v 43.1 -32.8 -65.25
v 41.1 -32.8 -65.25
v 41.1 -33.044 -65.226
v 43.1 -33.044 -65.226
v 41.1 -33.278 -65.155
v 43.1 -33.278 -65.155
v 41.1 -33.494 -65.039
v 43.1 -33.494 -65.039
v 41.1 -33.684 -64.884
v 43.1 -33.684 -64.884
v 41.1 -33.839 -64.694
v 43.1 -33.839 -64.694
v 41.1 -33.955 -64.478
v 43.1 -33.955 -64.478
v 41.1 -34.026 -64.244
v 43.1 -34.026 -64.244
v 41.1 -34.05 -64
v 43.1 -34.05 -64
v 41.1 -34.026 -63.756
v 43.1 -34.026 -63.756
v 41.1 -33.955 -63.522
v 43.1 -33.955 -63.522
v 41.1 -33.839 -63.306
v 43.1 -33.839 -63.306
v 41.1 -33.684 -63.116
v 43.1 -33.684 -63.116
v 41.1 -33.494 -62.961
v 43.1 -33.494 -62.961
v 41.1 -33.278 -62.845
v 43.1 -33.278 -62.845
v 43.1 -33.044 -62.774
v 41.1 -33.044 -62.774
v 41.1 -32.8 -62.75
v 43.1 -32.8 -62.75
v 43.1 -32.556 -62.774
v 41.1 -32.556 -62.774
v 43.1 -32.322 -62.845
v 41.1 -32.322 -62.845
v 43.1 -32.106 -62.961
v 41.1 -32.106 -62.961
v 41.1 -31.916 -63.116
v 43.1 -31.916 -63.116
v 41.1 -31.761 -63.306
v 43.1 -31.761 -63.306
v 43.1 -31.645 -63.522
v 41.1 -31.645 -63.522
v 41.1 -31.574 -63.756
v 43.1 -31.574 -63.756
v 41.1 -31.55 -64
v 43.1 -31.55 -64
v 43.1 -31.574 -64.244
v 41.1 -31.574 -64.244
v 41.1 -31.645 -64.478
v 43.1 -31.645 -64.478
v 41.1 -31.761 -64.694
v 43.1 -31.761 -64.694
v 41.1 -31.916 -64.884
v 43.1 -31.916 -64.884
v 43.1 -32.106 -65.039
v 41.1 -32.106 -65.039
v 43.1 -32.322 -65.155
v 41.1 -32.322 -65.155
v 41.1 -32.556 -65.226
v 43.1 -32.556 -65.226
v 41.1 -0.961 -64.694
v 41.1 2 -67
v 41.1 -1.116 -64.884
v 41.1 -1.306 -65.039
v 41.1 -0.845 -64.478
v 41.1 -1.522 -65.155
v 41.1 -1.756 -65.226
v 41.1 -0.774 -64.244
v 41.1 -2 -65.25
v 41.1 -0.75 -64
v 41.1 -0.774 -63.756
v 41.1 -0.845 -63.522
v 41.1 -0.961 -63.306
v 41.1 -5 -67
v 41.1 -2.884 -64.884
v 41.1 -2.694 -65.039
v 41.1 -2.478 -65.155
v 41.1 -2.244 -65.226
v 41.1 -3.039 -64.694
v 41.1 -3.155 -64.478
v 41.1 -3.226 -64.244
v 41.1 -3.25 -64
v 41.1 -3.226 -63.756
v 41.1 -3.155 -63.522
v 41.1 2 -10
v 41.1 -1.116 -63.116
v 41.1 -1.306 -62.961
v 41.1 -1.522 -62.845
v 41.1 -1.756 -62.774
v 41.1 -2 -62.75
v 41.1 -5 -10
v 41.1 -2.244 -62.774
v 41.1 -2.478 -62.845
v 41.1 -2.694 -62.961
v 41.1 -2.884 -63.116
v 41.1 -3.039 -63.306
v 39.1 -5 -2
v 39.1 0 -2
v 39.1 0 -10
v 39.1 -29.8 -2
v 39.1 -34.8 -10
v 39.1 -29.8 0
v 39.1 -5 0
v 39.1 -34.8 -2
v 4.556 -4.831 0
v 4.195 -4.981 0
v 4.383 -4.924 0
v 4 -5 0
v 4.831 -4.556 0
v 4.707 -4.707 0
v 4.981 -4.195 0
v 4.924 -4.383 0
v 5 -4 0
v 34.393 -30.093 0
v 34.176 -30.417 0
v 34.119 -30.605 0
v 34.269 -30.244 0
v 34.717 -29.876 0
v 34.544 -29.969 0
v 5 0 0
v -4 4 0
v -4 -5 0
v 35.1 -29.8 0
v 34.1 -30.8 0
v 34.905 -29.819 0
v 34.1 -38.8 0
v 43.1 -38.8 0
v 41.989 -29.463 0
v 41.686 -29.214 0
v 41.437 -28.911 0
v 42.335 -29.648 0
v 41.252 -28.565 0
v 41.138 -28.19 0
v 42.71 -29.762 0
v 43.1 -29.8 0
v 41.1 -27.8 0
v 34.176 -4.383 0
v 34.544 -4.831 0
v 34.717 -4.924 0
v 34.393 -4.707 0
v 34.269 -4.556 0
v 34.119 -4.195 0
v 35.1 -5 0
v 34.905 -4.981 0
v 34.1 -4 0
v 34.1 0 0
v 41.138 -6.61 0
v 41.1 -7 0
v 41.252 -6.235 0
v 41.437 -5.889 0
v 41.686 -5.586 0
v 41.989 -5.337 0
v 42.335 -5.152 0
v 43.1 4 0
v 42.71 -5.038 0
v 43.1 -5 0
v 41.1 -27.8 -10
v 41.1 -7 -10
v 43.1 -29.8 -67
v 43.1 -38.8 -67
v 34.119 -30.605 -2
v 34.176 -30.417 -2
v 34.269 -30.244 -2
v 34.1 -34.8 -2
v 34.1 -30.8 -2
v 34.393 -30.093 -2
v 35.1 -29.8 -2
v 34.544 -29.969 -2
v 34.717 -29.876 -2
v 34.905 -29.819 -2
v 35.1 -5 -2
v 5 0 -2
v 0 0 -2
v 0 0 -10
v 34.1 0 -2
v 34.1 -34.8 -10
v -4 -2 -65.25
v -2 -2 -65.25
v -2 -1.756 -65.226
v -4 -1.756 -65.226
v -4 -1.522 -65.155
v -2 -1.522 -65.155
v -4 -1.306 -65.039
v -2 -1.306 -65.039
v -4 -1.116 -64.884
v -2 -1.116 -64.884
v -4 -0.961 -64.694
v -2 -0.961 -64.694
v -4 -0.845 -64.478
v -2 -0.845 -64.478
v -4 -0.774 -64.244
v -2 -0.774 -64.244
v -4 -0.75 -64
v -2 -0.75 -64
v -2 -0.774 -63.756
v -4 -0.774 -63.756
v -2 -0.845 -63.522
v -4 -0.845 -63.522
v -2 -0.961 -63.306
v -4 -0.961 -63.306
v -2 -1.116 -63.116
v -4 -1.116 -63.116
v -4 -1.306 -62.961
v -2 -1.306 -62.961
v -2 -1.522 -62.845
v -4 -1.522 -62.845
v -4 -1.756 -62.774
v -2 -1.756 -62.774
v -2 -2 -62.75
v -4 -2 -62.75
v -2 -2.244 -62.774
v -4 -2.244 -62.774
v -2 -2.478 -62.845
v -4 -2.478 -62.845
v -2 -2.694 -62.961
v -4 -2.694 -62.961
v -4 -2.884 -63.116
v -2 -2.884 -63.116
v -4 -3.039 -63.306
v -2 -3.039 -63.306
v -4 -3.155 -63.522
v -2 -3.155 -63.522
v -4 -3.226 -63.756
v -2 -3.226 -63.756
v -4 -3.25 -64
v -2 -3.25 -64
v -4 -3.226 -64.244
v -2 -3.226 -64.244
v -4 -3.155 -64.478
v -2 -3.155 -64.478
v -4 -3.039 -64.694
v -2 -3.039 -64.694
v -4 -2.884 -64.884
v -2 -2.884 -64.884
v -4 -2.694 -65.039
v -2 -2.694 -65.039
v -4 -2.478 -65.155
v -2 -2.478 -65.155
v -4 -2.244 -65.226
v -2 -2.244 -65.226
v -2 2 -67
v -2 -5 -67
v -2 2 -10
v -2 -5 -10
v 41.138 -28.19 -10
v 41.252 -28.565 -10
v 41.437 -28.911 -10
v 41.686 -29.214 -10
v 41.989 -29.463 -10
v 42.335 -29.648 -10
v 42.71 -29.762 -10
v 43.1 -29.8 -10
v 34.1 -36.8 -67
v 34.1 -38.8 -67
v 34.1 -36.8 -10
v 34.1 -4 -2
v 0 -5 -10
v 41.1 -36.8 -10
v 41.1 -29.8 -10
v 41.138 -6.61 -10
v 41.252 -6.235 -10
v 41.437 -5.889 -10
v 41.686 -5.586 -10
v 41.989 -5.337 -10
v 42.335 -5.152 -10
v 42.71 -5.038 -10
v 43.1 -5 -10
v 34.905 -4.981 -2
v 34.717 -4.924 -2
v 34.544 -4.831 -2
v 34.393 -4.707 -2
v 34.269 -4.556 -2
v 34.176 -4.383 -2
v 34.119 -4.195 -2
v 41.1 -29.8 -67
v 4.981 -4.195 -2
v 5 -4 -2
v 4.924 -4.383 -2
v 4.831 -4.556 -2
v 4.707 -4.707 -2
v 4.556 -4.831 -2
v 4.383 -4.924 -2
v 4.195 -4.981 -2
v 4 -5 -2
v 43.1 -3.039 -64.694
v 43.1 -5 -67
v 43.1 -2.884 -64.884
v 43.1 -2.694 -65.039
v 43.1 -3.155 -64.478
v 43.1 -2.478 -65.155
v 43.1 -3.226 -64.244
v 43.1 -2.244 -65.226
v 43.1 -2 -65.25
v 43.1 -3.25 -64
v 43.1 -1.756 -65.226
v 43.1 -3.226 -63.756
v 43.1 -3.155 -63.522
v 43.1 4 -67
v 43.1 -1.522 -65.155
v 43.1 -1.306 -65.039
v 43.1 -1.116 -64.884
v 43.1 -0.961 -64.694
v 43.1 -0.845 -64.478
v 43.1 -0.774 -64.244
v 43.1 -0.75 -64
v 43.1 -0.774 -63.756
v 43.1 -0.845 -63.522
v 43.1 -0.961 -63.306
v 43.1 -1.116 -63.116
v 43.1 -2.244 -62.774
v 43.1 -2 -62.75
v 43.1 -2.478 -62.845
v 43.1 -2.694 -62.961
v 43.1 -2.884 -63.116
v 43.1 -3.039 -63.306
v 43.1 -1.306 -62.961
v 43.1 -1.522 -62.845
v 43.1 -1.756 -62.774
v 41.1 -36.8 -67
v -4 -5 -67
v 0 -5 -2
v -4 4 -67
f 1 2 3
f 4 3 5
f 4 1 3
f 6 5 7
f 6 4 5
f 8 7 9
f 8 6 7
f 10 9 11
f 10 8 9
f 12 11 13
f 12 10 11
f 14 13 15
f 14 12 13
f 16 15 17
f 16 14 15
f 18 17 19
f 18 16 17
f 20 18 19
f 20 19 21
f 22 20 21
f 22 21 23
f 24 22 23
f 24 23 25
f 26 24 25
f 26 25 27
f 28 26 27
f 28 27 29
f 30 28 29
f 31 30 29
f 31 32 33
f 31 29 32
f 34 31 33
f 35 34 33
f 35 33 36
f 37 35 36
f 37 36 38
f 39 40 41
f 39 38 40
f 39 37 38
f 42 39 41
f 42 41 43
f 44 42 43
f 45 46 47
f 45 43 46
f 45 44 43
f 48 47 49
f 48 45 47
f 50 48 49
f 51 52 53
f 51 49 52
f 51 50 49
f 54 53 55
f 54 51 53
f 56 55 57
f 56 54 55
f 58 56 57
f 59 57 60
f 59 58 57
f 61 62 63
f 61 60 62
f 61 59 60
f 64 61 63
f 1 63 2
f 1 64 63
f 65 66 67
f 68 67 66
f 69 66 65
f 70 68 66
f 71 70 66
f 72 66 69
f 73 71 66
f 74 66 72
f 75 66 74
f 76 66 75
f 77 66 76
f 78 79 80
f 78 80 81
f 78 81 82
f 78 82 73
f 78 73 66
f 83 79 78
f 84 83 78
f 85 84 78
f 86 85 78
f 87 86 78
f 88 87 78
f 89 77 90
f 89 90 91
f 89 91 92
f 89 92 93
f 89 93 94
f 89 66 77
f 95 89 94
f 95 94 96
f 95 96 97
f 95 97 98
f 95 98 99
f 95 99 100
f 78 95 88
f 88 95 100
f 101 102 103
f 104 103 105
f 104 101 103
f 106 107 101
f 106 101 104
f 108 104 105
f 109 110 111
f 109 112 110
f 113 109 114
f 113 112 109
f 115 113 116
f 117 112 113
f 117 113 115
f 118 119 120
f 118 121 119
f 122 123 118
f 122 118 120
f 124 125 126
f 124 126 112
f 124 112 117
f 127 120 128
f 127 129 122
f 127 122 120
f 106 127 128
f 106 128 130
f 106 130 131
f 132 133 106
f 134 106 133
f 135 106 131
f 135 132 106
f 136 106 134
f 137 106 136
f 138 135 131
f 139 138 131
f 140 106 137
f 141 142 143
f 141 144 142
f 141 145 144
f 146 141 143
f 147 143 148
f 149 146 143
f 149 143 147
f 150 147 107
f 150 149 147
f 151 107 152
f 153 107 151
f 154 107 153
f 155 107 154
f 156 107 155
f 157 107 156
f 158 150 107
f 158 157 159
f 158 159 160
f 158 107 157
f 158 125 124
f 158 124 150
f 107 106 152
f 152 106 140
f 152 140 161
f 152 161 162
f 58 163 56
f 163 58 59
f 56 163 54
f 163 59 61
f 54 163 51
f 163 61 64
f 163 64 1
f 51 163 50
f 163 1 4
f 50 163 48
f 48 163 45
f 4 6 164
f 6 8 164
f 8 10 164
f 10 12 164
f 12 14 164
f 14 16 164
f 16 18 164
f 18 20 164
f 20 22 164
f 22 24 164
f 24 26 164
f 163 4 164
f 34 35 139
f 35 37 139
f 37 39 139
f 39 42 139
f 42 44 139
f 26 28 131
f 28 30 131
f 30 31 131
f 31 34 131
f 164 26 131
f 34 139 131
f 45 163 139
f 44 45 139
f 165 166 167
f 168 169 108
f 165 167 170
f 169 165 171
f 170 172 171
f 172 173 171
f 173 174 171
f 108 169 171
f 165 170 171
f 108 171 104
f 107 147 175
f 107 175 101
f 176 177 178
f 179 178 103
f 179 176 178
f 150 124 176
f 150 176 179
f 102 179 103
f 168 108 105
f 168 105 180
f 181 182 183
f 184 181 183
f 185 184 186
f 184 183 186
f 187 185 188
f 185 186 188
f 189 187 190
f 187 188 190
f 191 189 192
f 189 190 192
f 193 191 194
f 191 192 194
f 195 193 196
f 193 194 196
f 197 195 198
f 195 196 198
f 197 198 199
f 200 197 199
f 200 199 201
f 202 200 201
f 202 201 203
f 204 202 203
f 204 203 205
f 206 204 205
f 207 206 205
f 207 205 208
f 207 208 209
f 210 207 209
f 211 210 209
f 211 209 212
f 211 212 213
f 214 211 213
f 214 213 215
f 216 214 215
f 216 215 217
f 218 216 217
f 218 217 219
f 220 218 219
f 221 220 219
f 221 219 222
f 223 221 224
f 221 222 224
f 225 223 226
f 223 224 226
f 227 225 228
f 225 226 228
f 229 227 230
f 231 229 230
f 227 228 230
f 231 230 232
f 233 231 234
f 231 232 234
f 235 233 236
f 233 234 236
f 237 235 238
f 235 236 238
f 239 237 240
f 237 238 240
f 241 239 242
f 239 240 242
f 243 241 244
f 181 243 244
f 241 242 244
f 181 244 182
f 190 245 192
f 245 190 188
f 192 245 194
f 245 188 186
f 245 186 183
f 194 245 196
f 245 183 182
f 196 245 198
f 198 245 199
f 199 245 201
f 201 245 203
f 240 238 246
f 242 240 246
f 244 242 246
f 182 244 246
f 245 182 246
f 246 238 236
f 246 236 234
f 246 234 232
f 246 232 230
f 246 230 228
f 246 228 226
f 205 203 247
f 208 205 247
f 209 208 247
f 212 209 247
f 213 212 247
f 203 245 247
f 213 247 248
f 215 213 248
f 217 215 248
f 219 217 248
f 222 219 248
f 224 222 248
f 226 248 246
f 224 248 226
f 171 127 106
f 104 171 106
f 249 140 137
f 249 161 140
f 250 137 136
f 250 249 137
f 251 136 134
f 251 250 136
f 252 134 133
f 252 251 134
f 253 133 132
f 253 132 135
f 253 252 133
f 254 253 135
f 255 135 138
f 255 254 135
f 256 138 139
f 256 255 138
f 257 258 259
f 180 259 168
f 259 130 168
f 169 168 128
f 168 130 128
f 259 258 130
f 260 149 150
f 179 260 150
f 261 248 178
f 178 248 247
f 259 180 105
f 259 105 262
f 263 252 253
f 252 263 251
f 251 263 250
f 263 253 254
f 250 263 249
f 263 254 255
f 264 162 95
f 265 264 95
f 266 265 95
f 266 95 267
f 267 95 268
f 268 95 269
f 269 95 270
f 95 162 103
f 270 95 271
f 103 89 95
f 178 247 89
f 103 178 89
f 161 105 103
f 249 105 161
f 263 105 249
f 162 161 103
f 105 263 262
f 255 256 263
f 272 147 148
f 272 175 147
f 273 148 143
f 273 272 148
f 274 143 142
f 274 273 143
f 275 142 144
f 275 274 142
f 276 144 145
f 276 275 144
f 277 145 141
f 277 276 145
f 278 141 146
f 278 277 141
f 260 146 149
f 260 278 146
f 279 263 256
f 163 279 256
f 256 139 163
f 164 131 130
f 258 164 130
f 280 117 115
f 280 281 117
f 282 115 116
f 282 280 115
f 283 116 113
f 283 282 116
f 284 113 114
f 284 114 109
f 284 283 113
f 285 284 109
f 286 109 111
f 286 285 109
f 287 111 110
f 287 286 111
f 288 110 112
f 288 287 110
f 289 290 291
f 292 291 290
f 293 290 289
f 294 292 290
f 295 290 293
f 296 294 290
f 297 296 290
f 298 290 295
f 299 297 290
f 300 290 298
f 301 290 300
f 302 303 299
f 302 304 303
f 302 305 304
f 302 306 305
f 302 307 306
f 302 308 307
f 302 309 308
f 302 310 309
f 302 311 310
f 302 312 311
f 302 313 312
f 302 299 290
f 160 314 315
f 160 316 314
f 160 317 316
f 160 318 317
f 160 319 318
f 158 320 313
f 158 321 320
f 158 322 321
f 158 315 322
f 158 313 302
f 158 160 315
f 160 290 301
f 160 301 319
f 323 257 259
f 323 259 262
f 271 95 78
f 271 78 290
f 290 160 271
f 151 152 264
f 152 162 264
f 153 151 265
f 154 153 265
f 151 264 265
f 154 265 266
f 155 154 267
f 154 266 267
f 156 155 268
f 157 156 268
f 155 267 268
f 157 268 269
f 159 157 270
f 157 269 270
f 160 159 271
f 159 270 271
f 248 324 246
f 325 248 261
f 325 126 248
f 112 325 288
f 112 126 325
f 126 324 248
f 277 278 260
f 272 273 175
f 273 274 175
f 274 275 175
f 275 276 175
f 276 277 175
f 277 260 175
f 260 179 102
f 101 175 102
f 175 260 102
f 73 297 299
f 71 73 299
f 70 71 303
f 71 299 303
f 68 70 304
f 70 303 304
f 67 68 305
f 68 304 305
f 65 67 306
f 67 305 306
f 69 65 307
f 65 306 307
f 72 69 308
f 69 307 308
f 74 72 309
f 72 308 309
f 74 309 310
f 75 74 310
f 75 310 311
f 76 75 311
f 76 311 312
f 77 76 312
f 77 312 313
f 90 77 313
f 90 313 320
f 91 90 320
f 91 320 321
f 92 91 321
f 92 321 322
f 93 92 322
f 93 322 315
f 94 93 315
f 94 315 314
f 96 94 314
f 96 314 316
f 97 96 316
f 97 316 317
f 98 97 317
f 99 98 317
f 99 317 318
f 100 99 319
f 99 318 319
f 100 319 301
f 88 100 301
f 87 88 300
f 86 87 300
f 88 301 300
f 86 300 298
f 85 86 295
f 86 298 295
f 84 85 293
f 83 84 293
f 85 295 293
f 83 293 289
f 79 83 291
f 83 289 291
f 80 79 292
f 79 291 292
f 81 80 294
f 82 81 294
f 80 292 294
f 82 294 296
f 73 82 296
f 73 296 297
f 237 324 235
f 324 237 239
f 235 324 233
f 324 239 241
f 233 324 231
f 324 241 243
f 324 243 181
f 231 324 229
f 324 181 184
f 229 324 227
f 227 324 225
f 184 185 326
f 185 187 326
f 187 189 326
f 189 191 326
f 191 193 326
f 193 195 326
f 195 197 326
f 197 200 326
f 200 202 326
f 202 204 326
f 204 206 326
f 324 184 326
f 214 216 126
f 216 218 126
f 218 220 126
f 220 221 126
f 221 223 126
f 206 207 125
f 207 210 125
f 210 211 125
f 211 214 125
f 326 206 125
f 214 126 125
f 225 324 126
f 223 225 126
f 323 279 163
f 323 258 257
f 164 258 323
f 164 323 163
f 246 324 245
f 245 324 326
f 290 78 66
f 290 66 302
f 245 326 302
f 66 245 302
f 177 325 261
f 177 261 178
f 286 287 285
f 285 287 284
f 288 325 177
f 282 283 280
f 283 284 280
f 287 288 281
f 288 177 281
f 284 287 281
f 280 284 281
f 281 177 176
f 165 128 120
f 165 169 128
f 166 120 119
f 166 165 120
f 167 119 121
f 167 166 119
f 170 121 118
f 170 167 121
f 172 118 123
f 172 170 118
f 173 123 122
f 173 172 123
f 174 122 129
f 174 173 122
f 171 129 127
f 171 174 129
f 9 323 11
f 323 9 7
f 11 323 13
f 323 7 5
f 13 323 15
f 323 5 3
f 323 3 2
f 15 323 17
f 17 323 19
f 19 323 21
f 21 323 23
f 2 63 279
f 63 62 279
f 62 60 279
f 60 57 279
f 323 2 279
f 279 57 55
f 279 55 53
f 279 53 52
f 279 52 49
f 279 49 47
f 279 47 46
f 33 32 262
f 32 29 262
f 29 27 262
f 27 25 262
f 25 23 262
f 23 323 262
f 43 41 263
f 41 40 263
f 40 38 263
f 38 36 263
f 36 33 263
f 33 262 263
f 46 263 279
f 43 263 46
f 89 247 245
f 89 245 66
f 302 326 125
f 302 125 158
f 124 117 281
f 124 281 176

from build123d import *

# Parameters (mm, degrees)
EXTRUDE_THIN1_DEPTH  = 10
SKETCH2_W            = 7
SKETCH2_H            = 7
BOSS_EXTRUDE1_DEPTH  = 2
FILLET1_R            = 1
BOSS_EXTRUDE2_DEPTH  = 67
SKETCH4_R            = 1.25
CUT_EXTRUDE1_DEPTH   = 91.624775862
FILLET2_R            = 2
MOVE_START           = -67
MOVE_FACE1_OUTLINE_W = 29.1
MOVE_FACE1_OUTLINE_H = 2
MOVE_FACE1_DEPTH     = 67


# Read off the part's stored shape, not the designer's step: Move Face1
with BuildPart() as part:
    # Sketch1 → Extrude-Thin1 (new body)
    with BuildSketch(Plane.XY):
        Polygon((0, -5), (0, 0), (39.1, 0), (39.1, -34.8), (34.1, -34.8), (34.1, -36.8), (41.1, -36.8), (41.1, 2), (-2, 2), (-2, -5), align=None)
    extrude(amount=-EXTRUDE_THIN1_DEPTH)

    # Sketch2 → Boss-Extrude1 (add)
    with BuildSketch(Plane.XY):
        with Locations((1.5, -1.5)):
            Rectangle(SKETCH2_W, SKETCH2_H)
        with Locations((37.6, -1.5)):
            Rectangle(SKETCH2_W, SKETCH2_H)
        with Locations((37.6, -33.3)):
            Rectangle(SKETCH2_W, SKETCH2_H)
    extrude(amount=-BOSS_EXTRUDE1_DEPTH)

    # Fillet1
    fillet1_edges = [part.edges().sort_by_distance(p)[0] for p in [
        (5, -5, -1),
        (34.1, -5, -1),
        (34.1, -29.8, -1),
    ]]
    fillet(fillet1_edges, radius=FILLET1_R)

    # Sketch3 → Boss-Extrude2 (add)
    with BuildSketch(Plane.XY):
        Polygon((34.1, 2), (41.1, 2), (41.1, -5), (43.1, -5), (43.1, 4), (34.1, 4), align=None)
    boss_extrude2 = extrude(amount=-BOSS_EXTRUDE2_DEPTH)

    # Mirror1: Boss-Extrude2 across plane
    add(boss_extrude2.mirror(Plane(origin=(19.55, 0, 0), x_dir=(0, 0, 1), z_dir=(1, 0, 0))))

    # Mirror2: Boss-Extrude2 across plane
    add(boss_extrude2.mirror(Plane.ZX.offset(-17.4)))

    # Sketch4 → Cut-Extrude1 (cut, through all)
    with BuildSketch(Plane(origin=(43.1, 0, 0), x_dir=(0, 0, -1), z_dir=(1, 0, 0))):
        with Locations((64, -2)):
            Circle(SKETCH4_R)
    cut_extrude1 = extrude(amount=-CUT_EXTRUDE1_DEPTH, mode=Mode.SUBTRACT)

    # Mirror3: Cut-Extrude1 across plane
    add(cut_extrude1.mirror(Plane.ZX.offset(-17.4)), mode=Mode.SUBTRACT)

    # Fillet2
    fillet2_edges = [part.edges().sort_by_distance(p)[0] for p in [
        (41.1, -29.8, -5),
        (41.1, -5, -5),
    ]]
    fillet(fillet2_edges, radius=FILLET2_R - 0.0001)  # a hair under: the kernel refuses the full size

    # Move Face1 outline → Move Face1 (add)
    with BuildSketch(Plane.XY.offset(MOVE_START)):
        with Locations((19.55, 3)):
            Rectangle(MOVE_FACE1_OUTLINE_W, MOVE_FACE1_OUTLINE_H)
    extrude(amount=MOVE_FACE1_DEPTH)


solid = part.part
